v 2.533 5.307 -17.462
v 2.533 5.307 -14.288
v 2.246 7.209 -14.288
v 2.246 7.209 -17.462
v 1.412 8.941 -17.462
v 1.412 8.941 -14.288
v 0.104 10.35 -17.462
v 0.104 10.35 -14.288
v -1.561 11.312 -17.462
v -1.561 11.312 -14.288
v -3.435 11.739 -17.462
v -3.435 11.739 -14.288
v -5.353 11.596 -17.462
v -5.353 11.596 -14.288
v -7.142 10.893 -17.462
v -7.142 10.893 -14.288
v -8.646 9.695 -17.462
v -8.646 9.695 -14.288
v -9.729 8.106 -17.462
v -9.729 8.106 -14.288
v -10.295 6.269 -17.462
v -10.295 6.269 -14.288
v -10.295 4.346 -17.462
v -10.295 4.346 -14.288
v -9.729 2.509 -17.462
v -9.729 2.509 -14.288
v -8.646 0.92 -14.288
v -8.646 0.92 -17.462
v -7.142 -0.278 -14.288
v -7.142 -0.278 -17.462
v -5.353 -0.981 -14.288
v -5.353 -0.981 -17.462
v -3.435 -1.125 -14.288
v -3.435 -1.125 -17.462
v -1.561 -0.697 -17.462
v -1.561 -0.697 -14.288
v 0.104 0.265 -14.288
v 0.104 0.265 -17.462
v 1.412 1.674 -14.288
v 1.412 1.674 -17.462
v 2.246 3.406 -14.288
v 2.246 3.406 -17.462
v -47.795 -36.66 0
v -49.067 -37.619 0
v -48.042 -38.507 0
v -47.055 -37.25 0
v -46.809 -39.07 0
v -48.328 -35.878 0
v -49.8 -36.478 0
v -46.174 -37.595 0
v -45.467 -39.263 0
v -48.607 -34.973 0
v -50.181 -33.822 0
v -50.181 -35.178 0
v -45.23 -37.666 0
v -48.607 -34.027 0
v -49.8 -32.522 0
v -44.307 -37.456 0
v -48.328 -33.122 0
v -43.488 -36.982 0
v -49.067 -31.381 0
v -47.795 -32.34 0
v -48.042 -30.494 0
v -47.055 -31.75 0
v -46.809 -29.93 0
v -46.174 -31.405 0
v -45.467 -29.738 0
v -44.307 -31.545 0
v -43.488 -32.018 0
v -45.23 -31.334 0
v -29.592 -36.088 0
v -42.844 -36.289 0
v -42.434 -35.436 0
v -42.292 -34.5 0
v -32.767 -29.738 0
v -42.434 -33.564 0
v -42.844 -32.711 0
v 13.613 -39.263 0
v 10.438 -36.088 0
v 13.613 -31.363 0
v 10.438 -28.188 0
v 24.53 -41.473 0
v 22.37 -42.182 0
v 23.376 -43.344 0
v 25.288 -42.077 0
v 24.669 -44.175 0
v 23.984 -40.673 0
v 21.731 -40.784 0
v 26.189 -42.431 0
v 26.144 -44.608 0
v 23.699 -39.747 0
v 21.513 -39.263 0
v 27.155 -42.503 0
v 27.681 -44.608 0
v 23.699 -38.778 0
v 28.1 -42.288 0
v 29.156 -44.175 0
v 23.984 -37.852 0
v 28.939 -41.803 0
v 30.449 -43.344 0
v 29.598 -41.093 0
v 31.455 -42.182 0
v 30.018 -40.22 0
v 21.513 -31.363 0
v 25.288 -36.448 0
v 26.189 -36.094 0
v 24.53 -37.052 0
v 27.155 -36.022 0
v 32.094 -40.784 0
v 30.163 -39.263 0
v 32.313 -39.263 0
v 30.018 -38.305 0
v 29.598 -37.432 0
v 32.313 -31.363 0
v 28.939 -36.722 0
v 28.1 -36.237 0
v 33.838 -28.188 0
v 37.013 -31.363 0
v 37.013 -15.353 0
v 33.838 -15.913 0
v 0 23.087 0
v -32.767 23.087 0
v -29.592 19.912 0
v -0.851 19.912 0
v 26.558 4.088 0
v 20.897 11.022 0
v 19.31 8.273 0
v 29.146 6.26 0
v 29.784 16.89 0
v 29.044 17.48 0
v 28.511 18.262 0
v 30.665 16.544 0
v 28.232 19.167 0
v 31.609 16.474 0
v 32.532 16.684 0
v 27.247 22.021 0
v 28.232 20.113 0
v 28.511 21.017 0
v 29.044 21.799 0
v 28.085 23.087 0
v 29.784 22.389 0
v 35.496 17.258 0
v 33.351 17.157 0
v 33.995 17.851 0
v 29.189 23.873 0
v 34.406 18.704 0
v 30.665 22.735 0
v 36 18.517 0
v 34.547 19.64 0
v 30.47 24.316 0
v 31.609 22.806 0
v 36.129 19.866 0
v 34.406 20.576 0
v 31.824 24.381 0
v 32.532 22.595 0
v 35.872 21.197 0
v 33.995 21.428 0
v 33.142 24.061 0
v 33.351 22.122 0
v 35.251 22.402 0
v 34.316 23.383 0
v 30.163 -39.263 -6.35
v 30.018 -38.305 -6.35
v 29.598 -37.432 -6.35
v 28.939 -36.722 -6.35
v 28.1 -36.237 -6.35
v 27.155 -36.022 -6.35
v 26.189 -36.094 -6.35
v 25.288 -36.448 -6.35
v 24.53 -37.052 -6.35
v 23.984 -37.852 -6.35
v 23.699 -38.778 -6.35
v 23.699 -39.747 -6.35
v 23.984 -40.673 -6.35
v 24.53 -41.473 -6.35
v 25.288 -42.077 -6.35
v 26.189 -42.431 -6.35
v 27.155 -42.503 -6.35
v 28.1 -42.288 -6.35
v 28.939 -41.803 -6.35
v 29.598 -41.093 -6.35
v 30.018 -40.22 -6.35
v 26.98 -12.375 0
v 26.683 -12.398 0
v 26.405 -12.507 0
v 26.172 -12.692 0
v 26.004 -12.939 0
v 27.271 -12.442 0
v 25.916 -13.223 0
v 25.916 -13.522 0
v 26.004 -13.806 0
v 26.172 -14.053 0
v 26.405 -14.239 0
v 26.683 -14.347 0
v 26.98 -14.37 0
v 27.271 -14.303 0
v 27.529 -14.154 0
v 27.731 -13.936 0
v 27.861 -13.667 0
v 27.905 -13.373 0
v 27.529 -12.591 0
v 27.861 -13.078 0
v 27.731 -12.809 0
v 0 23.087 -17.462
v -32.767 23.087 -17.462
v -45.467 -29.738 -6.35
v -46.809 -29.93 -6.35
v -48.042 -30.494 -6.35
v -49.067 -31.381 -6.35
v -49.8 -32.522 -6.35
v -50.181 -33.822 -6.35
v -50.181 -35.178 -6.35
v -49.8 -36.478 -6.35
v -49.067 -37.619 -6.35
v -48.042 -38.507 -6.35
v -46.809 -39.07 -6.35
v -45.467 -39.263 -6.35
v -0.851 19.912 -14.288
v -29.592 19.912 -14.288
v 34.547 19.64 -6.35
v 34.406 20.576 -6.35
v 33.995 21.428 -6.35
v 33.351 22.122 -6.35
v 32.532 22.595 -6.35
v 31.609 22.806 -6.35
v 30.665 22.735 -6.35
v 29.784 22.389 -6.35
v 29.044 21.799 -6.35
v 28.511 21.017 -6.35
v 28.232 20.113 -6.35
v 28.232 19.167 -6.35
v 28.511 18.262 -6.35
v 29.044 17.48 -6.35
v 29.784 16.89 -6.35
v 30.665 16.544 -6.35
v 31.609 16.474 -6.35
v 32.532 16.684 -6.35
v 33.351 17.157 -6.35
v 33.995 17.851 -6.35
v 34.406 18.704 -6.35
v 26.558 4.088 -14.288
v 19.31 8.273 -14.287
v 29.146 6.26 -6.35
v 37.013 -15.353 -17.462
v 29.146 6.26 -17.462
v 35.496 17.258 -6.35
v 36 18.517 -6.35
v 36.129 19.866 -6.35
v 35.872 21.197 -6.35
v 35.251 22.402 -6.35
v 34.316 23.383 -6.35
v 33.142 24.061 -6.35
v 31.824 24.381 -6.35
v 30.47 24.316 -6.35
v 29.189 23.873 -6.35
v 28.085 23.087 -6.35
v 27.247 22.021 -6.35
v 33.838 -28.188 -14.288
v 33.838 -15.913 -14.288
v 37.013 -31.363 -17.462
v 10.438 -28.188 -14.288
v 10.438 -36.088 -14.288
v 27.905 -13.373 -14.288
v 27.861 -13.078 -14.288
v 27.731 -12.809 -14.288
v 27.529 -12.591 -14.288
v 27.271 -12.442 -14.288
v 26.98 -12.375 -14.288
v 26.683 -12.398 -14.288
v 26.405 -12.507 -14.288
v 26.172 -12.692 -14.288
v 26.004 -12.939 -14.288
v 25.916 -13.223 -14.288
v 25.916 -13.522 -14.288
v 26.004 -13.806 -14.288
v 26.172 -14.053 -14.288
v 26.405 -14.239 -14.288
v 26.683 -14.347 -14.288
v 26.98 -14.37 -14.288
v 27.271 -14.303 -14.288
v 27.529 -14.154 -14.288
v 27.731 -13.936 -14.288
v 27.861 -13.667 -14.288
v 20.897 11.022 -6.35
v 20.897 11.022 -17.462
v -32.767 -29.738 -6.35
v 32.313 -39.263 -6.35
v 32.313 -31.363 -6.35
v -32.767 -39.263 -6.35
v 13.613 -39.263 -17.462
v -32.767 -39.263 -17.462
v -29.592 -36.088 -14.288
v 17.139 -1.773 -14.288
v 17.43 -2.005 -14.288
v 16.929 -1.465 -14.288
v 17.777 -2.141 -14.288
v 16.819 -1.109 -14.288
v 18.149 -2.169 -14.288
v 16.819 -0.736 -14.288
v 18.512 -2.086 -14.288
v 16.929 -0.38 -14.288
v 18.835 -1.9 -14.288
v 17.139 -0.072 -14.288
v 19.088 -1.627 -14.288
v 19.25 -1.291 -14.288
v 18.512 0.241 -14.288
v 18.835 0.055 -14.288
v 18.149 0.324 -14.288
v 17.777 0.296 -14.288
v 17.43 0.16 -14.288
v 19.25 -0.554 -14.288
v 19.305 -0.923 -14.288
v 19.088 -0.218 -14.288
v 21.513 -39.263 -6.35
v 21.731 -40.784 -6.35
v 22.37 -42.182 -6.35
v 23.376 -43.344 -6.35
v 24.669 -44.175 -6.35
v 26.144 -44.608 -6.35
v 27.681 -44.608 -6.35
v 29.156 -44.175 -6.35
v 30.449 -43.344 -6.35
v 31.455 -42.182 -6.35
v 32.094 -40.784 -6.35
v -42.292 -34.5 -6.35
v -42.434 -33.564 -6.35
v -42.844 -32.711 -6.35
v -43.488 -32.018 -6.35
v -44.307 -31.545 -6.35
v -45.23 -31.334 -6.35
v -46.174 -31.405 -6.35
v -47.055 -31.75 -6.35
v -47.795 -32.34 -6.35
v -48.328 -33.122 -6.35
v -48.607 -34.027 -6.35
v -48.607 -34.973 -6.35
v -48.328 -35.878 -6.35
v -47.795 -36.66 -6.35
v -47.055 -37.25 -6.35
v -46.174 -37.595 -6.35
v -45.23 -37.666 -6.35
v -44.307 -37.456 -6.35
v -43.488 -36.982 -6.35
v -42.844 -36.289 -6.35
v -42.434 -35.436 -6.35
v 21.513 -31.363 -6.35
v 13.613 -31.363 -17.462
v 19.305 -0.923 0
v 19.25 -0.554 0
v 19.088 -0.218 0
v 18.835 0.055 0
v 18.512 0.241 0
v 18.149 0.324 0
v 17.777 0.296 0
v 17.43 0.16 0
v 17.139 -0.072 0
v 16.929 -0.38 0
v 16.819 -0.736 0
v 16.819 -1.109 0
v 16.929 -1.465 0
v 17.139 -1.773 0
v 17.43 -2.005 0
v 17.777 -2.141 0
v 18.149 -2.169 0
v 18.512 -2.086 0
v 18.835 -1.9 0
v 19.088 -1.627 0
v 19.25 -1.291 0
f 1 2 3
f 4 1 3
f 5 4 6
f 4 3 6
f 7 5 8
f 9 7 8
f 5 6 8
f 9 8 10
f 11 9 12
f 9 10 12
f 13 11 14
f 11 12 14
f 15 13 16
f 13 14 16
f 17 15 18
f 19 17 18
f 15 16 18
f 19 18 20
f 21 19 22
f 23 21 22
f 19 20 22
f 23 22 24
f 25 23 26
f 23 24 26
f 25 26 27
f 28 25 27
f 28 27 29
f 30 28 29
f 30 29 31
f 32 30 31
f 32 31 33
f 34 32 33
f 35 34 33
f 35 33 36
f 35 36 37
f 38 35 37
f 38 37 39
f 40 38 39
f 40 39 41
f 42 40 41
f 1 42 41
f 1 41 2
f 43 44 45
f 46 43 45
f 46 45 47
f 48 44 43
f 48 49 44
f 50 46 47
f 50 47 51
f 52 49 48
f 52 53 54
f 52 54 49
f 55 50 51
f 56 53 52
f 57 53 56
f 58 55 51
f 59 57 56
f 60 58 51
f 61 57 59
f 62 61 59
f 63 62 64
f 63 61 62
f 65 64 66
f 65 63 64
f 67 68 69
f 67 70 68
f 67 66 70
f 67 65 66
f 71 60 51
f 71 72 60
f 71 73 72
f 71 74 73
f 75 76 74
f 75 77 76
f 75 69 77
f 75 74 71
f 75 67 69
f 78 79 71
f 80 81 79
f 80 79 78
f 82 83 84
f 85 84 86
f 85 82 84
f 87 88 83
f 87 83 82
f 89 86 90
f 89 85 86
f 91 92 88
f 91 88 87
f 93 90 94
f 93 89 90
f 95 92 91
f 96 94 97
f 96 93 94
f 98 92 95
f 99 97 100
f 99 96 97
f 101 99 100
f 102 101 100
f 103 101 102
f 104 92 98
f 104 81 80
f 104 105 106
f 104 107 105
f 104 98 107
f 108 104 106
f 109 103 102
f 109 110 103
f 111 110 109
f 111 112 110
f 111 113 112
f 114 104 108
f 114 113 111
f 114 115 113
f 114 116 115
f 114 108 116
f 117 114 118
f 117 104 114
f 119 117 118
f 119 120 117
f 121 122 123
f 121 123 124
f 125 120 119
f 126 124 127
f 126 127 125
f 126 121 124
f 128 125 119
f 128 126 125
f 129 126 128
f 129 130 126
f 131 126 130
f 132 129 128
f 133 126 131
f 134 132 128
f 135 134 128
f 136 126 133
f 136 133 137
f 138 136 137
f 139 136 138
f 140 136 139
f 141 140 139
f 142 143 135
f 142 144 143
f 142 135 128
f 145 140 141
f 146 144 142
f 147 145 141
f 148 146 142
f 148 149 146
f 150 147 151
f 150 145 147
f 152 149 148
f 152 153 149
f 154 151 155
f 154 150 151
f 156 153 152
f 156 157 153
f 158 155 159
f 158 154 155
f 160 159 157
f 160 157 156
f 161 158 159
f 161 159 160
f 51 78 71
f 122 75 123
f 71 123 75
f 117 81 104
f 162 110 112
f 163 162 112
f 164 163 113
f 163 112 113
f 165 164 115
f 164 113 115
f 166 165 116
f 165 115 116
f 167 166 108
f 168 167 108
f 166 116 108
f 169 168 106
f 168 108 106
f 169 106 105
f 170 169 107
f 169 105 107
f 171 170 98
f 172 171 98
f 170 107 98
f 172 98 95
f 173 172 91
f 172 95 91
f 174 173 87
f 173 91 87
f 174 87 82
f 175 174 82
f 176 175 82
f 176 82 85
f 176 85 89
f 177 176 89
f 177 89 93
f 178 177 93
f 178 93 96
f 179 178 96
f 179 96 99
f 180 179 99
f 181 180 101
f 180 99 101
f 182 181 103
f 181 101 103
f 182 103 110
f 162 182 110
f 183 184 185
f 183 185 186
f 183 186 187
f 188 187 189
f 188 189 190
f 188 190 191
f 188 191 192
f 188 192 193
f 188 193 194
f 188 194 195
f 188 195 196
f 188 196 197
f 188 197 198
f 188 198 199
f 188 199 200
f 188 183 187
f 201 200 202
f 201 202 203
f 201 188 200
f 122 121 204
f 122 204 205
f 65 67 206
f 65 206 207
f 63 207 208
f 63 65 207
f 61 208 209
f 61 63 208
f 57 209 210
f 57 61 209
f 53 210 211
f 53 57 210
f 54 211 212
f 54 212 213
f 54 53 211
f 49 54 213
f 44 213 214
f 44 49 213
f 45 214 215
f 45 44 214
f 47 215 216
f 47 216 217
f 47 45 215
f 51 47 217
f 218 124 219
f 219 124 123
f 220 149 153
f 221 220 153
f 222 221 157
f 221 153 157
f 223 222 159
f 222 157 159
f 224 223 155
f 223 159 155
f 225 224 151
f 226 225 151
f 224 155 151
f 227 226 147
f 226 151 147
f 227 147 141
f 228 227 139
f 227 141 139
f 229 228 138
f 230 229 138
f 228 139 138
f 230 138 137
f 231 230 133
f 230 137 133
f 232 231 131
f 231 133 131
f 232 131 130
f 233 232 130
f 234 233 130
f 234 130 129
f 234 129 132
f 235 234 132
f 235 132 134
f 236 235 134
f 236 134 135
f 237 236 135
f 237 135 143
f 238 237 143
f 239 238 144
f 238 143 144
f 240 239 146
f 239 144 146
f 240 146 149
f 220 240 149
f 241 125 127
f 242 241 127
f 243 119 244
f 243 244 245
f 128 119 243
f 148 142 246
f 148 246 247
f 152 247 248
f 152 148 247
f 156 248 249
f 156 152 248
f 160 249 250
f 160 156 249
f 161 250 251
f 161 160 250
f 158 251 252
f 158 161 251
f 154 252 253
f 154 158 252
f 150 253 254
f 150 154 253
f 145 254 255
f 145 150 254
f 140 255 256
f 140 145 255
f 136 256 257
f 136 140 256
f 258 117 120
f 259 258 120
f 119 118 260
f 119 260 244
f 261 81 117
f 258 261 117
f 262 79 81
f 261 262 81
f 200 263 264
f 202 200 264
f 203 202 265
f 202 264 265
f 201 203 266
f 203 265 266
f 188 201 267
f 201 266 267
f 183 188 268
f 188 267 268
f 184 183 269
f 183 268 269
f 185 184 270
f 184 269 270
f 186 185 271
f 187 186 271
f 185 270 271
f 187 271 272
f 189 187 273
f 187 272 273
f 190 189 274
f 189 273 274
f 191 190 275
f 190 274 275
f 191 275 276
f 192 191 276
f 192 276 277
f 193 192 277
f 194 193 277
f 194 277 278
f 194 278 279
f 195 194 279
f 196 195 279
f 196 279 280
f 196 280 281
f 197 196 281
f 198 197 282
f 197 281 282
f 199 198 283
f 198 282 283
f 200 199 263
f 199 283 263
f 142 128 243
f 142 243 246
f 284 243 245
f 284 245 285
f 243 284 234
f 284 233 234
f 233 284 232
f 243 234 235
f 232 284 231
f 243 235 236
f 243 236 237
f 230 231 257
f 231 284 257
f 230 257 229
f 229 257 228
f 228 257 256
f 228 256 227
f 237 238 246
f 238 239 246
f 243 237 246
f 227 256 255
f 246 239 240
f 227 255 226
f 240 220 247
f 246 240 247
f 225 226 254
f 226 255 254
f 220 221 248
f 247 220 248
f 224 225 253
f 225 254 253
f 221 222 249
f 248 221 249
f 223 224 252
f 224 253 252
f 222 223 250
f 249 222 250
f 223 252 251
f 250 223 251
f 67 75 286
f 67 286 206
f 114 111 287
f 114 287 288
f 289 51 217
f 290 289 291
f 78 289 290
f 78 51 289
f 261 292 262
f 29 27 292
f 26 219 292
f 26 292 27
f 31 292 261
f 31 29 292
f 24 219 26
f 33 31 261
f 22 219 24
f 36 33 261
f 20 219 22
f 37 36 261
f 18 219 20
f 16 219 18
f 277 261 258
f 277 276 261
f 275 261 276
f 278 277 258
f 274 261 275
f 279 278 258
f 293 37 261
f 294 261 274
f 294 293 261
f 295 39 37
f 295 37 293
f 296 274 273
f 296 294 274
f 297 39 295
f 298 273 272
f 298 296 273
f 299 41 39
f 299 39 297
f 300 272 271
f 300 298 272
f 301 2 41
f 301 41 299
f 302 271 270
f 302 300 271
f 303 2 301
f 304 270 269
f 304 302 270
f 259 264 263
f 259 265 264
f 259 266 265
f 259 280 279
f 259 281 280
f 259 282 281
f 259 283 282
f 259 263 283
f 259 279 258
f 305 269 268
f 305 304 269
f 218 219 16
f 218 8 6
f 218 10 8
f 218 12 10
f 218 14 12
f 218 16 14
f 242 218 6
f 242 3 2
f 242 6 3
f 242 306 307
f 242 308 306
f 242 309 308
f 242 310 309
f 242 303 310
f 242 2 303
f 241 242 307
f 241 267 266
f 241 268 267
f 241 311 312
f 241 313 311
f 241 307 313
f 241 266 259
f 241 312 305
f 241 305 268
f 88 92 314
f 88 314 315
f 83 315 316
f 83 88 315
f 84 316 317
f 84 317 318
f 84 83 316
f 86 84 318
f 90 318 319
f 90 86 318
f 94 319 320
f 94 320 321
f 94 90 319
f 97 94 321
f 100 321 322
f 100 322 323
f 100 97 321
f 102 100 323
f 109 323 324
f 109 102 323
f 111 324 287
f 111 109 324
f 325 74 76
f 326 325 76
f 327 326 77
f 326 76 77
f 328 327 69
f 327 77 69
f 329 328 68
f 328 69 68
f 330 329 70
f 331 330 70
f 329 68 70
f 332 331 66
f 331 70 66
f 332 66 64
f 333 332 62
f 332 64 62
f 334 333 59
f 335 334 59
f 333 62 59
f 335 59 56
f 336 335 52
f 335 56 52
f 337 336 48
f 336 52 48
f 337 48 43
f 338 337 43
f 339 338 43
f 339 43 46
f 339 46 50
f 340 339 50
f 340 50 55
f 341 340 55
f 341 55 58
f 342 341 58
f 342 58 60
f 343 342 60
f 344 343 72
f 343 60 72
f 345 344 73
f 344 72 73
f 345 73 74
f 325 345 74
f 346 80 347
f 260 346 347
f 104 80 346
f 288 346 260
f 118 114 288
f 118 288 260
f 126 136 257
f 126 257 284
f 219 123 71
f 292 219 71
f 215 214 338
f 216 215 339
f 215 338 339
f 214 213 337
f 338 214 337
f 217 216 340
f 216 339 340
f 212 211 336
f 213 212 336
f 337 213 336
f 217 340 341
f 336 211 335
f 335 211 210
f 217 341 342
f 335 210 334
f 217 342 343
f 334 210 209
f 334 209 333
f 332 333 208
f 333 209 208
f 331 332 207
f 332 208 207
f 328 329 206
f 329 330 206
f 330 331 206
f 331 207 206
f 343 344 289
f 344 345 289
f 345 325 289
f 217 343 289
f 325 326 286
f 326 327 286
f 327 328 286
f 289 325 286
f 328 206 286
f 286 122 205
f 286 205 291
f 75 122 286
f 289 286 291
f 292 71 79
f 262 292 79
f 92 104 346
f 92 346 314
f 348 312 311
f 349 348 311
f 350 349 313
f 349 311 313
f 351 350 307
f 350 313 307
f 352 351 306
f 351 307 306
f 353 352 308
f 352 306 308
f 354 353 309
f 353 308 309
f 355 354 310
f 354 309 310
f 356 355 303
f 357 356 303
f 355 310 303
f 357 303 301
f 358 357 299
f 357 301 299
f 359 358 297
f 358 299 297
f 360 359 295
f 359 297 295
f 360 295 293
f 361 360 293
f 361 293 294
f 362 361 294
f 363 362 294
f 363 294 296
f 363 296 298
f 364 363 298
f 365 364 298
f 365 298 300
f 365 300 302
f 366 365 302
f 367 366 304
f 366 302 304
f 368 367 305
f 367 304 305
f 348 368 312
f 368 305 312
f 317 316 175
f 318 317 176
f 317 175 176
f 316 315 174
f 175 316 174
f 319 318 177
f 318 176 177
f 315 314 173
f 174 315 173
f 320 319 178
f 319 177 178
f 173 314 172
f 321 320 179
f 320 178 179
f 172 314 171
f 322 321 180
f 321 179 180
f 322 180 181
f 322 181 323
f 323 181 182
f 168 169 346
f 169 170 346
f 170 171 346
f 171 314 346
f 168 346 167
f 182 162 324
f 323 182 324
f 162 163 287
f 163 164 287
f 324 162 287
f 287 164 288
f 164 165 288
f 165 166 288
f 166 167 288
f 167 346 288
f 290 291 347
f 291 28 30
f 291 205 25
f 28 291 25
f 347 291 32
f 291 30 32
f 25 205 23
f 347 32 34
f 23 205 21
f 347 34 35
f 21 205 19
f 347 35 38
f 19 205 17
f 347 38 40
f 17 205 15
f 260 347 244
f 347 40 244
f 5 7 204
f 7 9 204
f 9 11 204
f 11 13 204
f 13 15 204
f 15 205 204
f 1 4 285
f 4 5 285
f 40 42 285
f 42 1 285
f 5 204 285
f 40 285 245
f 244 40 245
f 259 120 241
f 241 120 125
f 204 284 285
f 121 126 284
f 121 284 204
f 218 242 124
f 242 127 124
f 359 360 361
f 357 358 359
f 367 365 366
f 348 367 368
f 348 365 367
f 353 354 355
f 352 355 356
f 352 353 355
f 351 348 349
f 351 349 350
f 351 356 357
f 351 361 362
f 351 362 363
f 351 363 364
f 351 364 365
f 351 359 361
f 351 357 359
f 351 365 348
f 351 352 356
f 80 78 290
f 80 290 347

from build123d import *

# Parameters (mm, degrees)
F1_DEPTH = 17.4625
F2_T     = -3.175
F0_R     = 3.175
F0_R_2   = 3.25
F3_DEPTH = 6.35
F4_R     = 1
F4_R_2   = 1.25
F5_DEPTH = 14.2875
F4_R_3   = 6.45
F6_DEPTH = 3.176


# Not quite as in the source:
# - a feature names something its author has since deleted; it is built from what else it names


with BuildPart() as f1:
    # F0 (on Top) → F1 (new body)
    with BuildSketch(Plane.XY):
        Polygon((-32.7674517391, -39.2625403754), (13.6125482609, -39.2625403754), (13.6125482609, -31.3625403754), (21.5125482609, -31.3625403754), (32.3125482609, -31.3625403754), (37.0125482609, -31.3625403754), (37.0125482609, -15.3529706535), (29.1460849644, 6.2599596246), (20.8971929933, 11.0224596246), (0, 23.0874596246), (-32.7674517391, 23.0874596246), (-32.7674517391, -29.7375403754), align=None)
    extrude(amount=-F1_DEPTH)

    # F2
    f2_openings = [f1.faces().sort_by_distance(p)[0] for p in [
        (-2.028392, -9.399027, 0),
    ]]
    offset(amount=F2_T, openings=f2_openings, kind=Kind.INTERSECTION)

    # F0 (on Top) → F3 (join)
    with BuildSketch(Plane.XY):
        with BuildLine():
            Line((-45.4674517391, -39.2625403754), (-32.7674517391, -39.2625403754))
            Line((-32.7674517391, -39.2625403754), (-32.7674517391, -29.7375403754))
            Line((-32.7674517391, -29.7375403754), (-45.4674517391, -29.7375403754))
            ThreePointArc((-45.4674517391, -29.7375403754), (-50.2299517391, -34.5000403754), (-45.4674517391, -39.2625403754))
        make_face()
        with Locations((-45.4674517391, -34.5000403754)):
            Circle(F0_R, mode=Mode.SUBTRACT)
        with BuildLine():
            Line((27.2471929933, 22.0209822527), (20.8971929933, 11.0224596246))
            Line((20.8971929933, 11.0224596246), (29.1460849644, 6.2599596246))
            Line((29.1460849644, 6.2599596246), (35.4960849644, 17.2584822527))
            ThreePointArc((35.4960849644, 17.2584822527), (33.7528889788, 23.7641782382), (27.2471929933, 22.0209822527))
        make_face()
        with Locations((31.3716389788, 19.6397322527)):
            Circle(F0_R, mode=Mode.SUBTRACT)
        with BuildLine():
            Line((32.3125482609, -31.3625403754), (21.5125482609, -31.3625403754))
            Line((21.5125482609, -31.3625403754), (21.5125482609, -39.2625403754))
            ThreePointArc((21.5125482609, -39.2625403754), (26.9125482609, -44.6625403754), (32.3125482609, -39.2625403754))
            Line((32.3125482609, -39.2625403754), (32.3125482609, -31.3625403754))
        make_face()
        with Locations((26.9125482609, -39.2625403754)):
            Circle(F0_R_2, mode=Mode.SUBTRACT)
    extrude(amount=-F3_DEPTH)

    # F4 (on face) → F5 (join, through all)
    with BuildSketch(Plane.XY.offset(-14.2875)):
        with Locations((26.905224515, -13.3725403754)):
            Circle(F4_R)
        with Locations((18.055224515, -0.9225403754)):
            Circle(F4_R_2)
    extrude(amount=F5_DEPTH)

    # F4 (on face) → F6 (cut, through all)
    with BuildSketch(Plane.XY.offset(-14.2875)):
        with Locations((-3.9174517391, 5.3074596246)):
            Circle(F4_R_3)
    extrude(amount=-F6_DEPTH, mode=Mode.SUBTRACT)


solid = f1.part
